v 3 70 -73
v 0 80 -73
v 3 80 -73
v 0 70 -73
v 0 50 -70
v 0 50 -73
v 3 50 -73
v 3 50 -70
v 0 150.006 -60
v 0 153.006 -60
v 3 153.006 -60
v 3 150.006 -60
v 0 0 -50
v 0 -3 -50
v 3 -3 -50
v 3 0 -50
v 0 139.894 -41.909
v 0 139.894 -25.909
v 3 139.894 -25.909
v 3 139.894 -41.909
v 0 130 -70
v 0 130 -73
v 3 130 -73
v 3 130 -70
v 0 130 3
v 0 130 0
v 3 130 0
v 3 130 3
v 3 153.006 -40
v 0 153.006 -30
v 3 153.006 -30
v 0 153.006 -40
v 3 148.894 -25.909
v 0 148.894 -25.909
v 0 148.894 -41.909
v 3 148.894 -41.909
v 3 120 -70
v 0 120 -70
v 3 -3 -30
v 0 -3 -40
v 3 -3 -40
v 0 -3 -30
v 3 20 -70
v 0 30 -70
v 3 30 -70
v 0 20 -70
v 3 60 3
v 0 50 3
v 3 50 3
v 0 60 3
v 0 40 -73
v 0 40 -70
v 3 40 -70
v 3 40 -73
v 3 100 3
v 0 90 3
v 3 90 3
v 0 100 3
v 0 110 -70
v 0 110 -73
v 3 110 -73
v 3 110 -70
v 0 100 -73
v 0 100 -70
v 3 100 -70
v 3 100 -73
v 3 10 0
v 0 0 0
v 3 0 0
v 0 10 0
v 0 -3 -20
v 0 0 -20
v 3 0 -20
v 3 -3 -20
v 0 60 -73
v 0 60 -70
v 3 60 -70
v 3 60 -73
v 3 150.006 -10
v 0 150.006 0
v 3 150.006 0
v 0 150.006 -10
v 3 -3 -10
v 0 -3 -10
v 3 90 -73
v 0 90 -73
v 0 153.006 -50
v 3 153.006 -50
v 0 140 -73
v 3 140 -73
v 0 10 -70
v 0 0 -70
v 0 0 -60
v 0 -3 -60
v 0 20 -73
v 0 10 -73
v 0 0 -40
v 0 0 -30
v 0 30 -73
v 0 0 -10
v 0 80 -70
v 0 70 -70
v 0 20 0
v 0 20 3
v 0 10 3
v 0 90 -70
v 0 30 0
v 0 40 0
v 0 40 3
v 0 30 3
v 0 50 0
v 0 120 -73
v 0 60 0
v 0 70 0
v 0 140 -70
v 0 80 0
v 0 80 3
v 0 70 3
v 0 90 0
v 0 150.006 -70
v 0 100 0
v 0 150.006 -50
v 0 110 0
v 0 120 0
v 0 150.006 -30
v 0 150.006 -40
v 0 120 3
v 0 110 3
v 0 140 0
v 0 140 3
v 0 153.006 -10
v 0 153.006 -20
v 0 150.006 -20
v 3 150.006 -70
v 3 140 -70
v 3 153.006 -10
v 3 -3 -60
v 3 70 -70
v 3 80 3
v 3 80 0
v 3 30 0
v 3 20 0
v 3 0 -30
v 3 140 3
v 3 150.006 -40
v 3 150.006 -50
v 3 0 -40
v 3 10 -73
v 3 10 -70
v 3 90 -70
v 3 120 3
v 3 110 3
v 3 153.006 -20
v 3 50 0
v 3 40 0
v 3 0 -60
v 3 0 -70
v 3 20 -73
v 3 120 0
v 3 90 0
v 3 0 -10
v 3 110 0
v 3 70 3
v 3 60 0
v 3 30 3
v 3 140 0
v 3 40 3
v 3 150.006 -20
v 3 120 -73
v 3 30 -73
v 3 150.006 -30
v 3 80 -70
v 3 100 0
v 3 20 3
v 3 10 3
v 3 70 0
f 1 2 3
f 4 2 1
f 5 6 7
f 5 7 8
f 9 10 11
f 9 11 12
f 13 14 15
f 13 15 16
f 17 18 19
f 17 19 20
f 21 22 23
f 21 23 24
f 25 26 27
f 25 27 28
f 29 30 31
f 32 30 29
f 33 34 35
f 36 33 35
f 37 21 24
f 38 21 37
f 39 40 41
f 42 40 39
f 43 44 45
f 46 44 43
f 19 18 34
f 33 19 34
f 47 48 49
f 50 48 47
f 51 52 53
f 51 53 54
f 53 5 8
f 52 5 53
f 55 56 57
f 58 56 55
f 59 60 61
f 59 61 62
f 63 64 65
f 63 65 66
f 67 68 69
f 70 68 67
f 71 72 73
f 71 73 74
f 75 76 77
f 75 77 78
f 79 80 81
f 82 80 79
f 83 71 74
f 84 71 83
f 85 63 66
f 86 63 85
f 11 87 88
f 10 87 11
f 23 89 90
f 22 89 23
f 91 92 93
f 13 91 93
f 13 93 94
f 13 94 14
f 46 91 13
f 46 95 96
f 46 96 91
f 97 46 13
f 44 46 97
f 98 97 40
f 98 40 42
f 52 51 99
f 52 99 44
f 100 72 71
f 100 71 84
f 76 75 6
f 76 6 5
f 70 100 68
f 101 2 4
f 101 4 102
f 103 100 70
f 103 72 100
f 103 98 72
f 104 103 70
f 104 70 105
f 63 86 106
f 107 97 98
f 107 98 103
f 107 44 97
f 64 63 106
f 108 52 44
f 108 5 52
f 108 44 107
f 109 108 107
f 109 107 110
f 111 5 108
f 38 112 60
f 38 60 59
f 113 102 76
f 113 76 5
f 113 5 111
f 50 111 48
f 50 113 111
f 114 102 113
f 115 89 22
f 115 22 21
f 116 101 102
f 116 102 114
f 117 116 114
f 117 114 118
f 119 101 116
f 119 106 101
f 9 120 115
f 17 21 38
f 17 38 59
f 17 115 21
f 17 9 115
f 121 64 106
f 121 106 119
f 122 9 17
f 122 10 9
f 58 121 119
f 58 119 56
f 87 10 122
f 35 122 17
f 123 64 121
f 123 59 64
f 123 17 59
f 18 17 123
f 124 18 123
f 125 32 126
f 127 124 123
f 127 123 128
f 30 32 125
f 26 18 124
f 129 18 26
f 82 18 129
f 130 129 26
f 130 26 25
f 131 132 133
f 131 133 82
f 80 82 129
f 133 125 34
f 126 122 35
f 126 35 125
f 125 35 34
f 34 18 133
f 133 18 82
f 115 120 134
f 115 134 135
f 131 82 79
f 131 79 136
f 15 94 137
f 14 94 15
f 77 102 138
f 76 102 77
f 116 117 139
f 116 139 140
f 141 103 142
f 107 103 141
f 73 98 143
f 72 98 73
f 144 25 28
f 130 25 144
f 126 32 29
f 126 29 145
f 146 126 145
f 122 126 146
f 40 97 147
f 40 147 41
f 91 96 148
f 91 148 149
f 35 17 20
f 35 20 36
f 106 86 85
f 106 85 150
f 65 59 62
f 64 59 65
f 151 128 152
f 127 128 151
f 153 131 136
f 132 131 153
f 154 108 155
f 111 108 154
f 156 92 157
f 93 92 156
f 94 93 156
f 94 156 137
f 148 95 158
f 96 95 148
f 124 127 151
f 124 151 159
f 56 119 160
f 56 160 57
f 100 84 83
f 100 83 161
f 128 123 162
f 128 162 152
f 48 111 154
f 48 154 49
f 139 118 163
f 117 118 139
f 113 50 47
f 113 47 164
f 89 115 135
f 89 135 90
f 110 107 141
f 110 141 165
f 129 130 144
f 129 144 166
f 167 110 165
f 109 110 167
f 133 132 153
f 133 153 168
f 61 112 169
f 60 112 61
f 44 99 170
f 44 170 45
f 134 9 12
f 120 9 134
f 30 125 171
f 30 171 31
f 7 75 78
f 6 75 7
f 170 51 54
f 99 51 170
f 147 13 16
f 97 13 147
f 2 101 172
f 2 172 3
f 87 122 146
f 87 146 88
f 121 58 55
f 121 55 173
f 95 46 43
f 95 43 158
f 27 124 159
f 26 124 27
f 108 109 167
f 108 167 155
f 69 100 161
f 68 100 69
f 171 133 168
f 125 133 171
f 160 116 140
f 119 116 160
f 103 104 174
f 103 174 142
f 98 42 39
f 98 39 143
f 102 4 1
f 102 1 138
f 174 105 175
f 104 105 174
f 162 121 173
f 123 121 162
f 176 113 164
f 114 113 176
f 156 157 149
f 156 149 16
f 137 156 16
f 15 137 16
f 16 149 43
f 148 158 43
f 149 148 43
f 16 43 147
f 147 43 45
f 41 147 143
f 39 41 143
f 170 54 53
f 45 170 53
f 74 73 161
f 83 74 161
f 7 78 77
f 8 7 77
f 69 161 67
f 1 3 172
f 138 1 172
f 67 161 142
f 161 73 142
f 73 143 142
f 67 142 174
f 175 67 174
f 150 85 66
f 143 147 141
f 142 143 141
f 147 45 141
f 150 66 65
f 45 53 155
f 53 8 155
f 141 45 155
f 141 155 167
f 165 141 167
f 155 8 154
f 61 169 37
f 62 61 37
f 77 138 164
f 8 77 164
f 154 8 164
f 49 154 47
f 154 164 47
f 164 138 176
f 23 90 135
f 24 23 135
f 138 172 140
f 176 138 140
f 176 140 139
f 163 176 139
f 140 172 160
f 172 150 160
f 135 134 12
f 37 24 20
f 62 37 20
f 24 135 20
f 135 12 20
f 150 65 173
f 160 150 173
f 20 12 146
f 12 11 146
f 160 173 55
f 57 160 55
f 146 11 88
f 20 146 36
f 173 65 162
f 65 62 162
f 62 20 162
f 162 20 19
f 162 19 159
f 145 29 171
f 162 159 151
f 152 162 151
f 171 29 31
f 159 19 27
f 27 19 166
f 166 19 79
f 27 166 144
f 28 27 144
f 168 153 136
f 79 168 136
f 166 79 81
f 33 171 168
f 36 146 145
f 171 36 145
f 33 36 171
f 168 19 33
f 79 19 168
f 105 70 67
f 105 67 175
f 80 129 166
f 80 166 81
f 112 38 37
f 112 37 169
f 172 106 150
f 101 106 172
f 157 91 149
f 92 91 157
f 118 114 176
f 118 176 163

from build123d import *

# Parameters (mm, degrees)
SKETCH1_W           = 16
SKETCH1_H           = 9
BOSS_EXTRUDE1_DEPTH = 3


with BuildPart() as part:
    # Sketch1 → Boss-Extrude1 (new body)
    with BuildSketch(Plane(origin=(0, 0, 0), x_dir=(0, 0, -1), z_dir=(1, 0, 0))):
        Polygon((10, 153.005875518), (20, 153.005875518), (20, 150.005875518), (30, 150.005875518), (30, 153.005875518), (40, 153.005875518), (40, 150.005875518), (50, 150.005875518), (50, 153.005875518), (60, 153.005875518), (60, 150.005875518), (70, 150.005875518), (70, 140), (73, 140), (73, 130), (70, 130), (70, 120), (73, 120), (73, 110), (70, 110), (70, 100), (73, 100), (73, 90), (70, 90), (70, 80), (73, 80), (73, 70), (70, 70), (70, 60), (73, 60), (73, 50), (70, 50), (70, 40), (73, 40), (73, 30), (70, 30), (70, 20), (73, 20), (73, 10), (70, 10), (70, 0), (60, 0), (60, -3), (50, -3), (50, 0), (40, 0), (40, -3), (30, -3), (30, 0), (20, 0), (20, -3), (10, -3), (10, 0), (0, 0), (0, 10), (-3, 10), (-3, 20), (0, 20), (0, 30), (-3, 30), (-3, 40), (0, 40), (0, 50), (-3, 50), (-3, 60), (0, 60), (0, 70), (-3, 70), (-3, 80), (0, 80), (0, 90), (-3, 90), (-3, 100), (0, 100), (0, 110), (-3, 110), (-3, 120), (0, 120), (0, 130), (-3, 130), (-3, 140), (0, 140), (0, 150.005875518), (10, 150.005875518), align=None)
        with Locations((33.90899457, 144.39356925)):
            Rectangle(SKETCH1_W, SKETCH1_H, mode=Mode.SUBTRACT)
    extrude(amount=BOSS_EXTRUDE1_DEPTH)


solid = part.part
